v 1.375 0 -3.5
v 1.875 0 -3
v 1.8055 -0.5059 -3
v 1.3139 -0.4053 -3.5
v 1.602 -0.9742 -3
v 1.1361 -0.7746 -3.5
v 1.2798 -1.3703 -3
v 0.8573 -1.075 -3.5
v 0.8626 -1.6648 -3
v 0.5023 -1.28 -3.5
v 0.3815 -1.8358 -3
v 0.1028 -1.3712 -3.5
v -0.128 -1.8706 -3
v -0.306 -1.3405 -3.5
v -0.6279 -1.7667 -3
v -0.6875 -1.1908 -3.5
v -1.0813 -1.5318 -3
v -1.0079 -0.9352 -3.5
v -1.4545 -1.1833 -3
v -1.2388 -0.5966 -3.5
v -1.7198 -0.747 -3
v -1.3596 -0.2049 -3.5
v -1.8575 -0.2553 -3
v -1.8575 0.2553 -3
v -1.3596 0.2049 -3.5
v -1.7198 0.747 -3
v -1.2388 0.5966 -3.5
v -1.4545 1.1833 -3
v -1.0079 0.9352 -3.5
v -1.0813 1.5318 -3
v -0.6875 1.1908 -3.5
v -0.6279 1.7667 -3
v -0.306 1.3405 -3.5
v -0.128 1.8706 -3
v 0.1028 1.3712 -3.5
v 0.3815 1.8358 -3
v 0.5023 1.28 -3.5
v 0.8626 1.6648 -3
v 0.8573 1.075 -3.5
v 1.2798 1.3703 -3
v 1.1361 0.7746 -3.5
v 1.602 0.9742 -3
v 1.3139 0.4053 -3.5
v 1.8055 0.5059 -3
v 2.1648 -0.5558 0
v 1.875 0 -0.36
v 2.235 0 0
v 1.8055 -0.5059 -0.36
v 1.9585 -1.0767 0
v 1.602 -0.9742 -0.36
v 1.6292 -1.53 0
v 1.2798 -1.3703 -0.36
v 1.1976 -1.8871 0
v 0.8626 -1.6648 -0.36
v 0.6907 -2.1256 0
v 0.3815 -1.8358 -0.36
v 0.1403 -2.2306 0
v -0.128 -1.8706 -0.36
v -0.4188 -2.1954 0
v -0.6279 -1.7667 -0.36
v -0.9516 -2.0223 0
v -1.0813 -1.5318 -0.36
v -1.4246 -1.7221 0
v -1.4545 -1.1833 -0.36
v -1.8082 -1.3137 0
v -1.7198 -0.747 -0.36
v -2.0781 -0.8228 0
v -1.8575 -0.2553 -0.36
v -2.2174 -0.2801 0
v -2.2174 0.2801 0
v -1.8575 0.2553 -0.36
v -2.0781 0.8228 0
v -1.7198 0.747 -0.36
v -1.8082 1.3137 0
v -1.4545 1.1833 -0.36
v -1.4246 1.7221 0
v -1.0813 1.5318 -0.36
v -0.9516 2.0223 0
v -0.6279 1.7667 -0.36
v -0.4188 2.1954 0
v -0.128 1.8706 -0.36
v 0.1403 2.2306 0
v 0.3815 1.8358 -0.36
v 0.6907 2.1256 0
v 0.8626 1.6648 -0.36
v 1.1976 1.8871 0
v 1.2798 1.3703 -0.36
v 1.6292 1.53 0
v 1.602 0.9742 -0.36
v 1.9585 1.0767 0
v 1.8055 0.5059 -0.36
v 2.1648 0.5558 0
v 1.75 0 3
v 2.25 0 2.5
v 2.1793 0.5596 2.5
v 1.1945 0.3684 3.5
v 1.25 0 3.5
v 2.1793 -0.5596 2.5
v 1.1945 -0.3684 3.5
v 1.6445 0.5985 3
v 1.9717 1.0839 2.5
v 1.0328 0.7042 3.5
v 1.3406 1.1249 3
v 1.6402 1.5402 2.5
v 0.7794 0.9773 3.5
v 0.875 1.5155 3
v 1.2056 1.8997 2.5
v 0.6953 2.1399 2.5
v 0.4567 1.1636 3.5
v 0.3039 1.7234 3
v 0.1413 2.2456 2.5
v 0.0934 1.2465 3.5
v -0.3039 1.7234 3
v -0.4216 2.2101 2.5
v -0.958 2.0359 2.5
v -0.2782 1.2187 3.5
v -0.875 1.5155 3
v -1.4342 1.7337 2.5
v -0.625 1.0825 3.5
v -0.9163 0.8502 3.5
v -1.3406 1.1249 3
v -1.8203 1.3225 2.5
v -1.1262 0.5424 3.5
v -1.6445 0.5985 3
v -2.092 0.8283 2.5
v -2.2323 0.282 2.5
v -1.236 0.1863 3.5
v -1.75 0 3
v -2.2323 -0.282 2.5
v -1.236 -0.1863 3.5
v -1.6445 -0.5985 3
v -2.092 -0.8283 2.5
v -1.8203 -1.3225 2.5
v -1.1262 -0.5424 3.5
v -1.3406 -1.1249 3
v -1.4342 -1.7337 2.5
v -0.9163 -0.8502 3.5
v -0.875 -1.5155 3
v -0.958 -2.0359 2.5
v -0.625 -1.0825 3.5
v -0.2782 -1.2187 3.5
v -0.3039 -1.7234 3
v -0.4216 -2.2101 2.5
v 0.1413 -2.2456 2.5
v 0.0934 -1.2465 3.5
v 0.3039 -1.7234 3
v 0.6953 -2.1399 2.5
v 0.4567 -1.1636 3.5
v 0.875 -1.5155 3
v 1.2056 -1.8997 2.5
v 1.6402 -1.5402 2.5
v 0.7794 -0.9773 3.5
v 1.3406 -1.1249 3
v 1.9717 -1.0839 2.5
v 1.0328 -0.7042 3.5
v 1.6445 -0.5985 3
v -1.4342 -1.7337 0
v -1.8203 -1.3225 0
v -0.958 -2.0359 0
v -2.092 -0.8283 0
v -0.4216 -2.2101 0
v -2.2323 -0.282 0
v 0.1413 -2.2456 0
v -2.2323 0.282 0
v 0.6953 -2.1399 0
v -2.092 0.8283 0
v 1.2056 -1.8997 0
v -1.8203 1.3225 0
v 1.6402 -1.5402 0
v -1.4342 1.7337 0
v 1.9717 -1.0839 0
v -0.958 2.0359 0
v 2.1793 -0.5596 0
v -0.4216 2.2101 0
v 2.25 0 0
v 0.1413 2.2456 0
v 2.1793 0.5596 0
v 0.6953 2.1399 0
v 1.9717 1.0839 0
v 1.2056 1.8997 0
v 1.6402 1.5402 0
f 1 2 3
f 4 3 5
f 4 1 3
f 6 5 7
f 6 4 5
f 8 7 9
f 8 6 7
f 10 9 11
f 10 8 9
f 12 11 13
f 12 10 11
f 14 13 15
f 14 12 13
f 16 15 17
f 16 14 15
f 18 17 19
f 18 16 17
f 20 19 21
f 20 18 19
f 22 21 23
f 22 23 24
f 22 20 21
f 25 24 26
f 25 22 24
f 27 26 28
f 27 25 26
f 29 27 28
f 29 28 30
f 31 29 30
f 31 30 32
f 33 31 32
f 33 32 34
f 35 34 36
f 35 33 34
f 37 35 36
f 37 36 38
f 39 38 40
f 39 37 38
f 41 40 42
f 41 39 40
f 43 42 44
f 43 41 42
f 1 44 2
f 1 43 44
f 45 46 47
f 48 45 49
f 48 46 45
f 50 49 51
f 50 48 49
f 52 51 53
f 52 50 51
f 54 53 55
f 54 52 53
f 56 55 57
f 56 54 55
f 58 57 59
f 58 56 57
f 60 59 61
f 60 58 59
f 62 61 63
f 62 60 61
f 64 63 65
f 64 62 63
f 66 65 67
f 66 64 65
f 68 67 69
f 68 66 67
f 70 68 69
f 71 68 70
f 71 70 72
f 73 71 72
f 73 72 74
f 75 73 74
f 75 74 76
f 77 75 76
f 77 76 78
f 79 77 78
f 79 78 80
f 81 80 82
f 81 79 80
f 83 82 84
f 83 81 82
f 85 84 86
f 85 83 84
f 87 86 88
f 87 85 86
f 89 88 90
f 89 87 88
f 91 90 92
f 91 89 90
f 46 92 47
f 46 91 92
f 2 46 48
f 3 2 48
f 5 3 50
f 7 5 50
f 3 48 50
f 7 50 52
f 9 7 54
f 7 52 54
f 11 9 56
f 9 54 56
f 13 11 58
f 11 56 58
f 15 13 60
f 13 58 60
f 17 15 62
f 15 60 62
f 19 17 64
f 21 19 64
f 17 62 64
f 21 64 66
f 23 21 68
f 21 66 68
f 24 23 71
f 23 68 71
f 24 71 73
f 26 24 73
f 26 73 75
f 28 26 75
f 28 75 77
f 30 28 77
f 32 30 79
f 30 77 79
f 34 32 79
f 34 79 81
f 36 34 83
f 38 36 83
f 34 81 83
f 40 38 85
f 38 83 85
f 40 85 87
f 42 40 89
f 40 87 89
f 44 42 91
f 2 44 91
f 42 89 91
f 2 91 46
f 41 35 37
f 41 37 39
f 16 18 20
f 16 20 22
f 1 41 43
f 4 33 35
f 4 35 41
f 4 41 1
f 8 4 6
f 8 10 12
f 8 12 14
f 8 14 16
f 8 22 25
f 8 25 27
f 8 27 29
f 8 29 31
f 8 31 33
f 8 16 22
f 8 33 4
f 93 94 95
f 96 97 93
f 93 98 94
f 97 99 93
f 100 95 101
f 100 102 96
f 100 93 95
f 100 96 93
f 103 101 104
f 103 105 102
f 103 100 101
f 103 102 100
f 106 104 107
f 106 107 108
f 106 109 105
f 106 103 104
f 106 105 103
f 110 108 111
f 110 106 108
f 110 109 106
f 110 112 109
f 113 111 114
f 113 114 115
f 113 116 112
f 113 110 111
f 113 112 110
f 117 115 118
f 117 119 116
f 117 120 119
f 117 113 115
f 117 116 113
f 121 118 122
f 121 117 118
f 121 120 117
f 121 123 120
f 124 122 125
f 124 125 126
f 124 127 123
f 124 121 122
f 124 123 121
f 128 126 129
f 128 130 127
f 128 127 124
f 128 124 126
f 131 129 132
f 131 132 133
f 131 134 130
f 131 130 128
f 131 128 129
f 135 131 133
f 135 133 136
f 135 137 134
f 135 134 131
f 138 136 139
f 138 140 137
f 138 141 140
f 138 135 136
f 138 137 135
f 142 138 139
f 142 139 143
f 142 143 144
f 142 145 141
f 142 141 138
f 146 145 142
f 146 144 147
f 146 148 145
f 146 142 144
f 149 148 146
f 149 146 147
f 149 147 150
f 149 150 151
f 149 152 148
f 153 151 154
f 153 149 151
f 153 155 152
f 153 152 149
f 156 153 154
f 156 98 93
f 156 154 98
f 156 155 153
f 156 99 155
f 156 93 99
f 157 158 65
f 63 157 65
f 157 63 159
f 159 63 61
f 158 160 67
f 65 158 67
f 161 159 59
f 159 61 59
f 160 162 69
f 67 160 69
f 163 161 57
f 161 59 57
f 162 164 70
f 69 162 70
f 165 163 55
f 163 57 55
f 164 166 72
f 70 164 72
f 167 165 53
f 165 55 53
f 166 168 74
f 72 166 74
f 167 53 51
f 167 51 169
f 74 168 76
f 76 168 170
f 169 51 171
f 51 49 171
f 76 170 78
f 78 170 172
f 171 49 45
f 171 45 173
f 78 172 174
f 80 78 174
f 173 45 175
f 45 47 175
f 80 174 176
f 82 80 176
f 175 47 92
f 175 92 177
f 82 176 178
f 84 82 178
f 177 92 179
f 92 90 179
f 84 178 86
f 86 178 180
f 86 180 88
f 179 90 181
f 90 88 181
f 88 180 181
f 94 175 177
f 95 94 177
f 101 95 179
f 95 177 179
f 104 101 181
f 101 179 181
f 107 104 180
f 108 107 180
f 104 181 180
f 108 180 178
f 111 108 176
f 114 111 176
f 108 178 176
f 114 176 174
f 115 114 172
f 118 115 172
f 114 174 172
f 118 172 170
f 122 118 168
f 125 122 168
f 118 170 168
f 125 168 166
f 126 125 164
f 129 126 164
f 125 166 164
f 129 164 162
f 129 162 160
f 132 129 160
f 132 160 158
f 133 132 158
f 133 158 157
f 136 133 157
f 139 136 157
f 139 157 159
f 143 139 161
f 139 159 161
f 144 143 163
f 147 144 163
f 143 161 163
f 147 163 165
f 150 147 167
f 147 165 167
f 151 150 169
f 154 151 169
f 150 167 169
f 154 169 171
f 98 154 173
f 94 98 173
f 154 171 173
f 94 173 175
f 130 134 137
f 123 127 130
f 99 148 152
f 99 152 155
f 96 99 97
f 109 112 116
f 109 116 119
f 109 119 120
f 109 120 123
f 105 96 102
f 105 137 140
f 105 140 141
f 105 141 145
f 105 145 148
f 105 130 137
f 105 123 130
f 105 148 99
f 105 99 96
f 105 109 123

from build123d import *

# Parameters (mm, degrees)
SKETCH017_R     = 2.25
PAD003_DEPTH    = 3.5
CHAMFER001_SIZE = 1
SKETCH020_R     = 1.875
PAD006_DEPTH    = 3.5
CHAMFER002_SIZE = 0.36
CHAMFER003_SIZE = 0.5


with BuildPart() as part:
    # Sketch017 → Pad003 (new body)
    with BuildSketch(Plane.XY):
        Circle(SKETCH017_R)
    extrude(amount=PAD003_DEPTH)

    # Chamfer001
    chamfer001_edges = [part.edges().sort_by_distance(p)[0] for p in [
        (-2.25, 0, 3.5),
    ]]
    chamfer(chamfer001_edges, length=CHAMFER001_SIZE)

    # Sketch020 (on Face3 of Chamfer001) → Pad006 (join)
    with BuildSketch(Plane(origin=(0, 0, 0), x_dir=(1, 0, 0), z_dir=(0, 0, -1))):
        Circle(SKETCH020_R)
    extrude(amount=PAD006_DEPTH)

    # Chamfer002
    chamfer002_edges = [part.edges().sort_by_distance(p)[0] for p in [
        (-1.875, 0, 0),
    ]]
    chamfer(chamfer002_edges, length=CHAMFER002_SIZE)

    # Chamfer003
    chamfer003_edges = [part.edges().sort_by_distance(p)[0] for p in [
        (-1.875, 0, -3.5),
    ]]
    chamfer(chamfer003_edges, length=CHAMFER003_SIZE)


solid = part.part
